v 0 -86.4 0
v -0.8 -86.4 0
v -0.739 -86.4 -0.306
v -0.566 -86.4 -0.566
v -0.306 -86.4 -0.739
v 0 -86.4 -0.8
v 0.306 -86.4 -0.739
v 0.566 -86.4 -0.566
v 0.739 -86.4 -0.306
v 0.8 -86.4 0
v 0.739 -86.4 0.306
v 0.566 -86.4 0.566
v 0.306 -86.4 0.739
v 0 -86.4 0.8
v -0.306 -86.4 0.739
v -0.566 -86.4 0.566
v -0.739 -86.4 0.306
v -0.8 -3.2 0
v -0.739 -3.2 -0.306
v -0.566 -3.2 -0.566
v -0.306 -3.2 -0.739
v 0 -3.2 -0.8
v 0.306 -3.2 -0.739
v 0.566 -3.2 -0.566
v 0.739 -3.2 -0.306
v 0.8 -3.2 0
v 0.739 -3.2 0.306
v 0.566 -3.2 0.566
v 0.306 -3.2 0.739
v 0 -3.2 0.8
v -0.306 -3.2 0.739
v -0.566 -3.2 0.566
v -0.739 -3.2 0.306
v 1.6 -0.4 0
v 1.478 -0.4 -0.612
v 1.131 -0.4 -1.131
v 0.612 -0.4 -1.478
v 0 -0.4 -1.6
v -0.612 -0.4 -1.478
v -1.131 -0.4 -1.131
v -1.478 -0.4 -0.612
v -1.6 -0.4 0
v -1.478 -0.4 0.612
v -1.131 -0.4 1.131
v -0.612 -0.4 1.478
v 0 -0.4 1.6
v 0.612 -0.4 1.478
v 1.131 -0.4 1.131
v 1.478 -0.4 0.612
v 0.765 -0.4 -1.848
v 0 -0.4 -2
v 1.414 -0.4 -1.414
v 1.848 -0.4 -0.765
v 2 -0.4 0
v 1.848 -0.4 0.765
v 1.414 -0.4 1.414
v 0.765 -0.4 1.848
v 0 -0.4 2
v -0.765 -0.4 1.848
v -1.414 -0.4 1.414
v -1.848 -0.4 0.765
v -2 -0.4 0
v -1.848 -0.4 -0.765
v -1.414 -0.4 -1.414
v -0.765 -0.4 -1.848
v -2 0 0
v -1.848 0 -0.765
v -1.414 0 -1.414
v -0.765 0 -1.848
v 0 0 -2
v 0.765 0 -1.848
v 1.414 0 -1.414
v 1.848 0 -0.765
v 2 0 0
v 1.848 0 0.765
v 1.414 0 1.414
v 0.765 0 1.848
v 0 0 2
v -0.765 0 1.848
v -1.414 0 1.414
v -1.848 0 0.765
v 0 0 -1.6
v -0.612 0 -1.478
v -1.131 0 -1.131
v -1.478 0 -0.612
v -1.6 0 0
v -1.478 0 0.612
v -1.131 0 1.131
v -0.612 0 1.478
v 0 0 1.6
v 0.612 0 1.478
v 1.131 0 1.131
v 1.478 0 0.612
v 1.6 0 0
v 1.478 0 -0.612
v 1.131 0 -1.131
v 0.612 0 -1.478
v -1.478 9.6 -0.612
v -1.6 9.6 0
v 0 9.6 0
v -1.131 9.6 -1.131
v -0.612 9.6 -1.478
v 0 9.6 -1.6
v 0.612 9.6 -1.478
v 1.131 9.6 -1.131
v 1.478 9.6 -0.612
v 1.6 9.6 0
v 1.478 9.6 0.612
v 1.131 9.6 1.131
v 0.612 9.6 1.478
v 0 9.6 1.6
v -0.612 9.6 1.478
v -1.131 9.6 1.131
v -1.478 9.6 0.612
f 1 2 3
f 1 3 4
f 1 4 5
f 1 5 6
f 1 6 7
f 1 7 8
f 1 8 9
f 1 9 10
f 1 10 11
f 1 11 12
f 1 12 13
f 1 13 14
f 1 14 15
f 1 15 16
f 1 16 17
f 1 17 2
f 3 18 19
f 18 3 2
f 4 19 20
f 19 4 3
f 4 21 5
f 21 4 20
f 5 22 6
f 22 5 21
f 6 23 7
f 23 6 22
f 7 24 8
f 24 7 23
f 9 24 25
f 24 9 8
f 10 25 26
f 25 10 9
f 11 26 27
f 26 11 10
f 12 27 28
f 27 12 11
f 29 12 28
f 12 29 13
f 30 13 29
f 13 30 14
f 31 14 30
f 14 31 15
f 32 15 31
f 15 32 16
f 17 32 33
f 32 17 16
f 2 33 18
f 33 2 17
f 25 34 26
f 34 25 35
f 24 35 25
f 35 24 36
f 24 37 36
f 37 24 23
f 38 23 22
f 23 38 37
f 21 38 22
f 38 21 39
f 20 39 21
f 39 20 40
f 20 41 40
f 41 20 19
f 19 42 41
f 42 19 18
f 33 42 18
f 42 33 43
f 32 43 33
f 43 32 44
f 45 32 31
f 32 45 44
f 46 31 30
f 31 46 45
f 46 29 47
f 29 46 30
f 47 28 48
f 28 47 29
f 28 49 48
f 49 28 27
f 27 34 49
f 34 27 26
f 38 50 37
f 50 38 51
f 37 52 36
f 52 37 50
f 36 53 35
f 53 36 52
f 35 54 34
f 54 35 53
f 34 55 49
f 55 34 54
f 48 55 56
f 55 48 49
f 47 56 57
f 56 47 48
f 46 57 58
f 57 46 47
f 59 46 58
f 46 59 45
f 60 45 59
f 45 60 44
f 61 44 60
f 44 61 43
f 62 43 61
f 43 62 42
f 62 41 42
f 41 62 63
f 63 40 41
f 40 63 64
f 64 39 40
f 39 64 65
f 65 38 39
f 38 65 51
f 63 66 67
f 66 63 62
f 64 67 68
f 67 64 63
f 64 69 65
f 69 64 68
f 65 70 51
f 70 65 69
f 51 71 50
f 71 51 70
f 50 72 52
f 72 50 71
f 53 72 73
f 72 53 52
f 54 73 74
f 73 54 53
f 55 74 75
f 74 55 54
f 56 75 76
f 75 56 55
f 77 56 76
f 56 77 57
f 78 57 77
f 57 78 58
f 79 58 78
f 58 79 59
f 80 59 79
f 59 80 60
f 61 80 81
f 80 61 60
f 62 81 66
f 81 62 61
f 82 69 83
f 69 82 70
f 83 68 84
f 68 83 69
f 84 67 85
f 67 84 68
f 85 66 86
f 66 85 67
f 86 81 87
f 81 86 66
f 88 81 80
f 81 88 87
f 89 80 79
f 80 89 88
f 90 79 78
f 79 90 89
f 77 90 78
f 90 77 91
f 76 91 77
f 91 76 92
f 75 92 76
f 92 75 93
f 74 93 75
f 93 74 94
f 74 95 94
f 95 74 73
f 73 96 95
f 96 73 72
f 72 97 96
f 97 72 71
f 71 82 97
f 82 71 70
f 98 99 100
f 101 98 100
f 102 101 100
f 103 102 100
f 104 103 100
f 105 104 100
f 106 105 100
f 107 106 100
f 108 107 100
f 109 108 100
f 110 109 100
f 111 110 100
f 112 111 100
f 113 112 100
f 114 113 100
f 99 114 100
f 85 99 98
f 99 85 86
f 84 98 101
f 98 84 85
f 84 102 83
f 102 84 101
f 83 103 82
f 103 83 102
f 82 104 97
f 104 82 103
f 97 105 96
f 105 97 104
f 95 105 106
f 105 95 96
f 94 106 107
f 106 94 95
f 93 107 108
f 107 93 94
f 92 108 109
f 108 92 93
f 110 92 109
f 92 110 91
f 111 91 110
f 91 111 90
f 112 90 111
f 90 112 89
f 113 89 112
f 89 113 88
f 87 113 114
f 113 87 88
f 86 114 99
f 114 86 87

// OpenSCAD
// file: ../p/stud3.scad
use <../lib.scad>
use <4-4cyli.scad>
use <4-4disc.scad>
use <4-4edge.scad>
$fa=1; $fs=0.2;
function ldraw_lib__stud3(realsolid=false) = realsolid ? 
    [openscad(translate([0,0,-eps()], o=cylinder(4+eps(), r=4)),2)] : [
// 0 Stud Tube Solid
// 0 Name: stud3.dat
// 0 Author: James Jessiman
// 0 !LDRAW_ORG Primitive UPDATE 2012-01
// 0 !LICENSE Licensed under CC BY 2.0 and CC BY 4.0 : see CAreadme.txt
// 
// 0 BFC CERTIFY CCW
  [0,"BFC","CERTIFY"],
  [0,"BFC","CCW"],
// 
// 0 !HISTORY 2002-04-04 [sbliss] Modified for BFC compliance
// 0 !HISTORY 2002-04-25 [PTadmin] Official Update 2002-02
// 0 !HISTORY 2007-06-24 [PTadmin] Header formatted for Contributor Agreement
// 0 !HISTORY 2008-07-01 [PTadmin] Official Update 2008-01
// 0 !HISTORY 2012-02-16 [Philo] Changed to CCW
// 0 !HISTORY 2012-03-30 [PTadmin] Official Update 2012-01
// 
// 
// 1 16 0 -4 0 4 0 0 0 1 0 0 0 4 4-4edge.dat
  [1,16,0,-4,0,4,0,0,0,1,0,0,0,4, ldraw_lib__4_4edge(realsolid)],
// 1 16 0 0 0 4 0 0 0 1 0 0 0 4 4-4edge.dat
  [1,16,0,0,0,4,0,0,0,1,0,0,0,4, ldraw_lib__4_4edge(realsolid)],
// 1 16 0 -4 0 4 0 0 0 1 0 0 0 4 4-4disc.dat
  [1,16,0,-4,0,4,0,0,0,1,0,0,0,4, ldraw_lib__4_4disc(realsolid)],
// 1 16 0 -4 0 4 0 0 0 4 0 0 0 4 4-4cyli.dat
  [1,16,0,-4,0,4,0,0,0,4,0,0,0,4, ldraw_lib__4_4cyli(realsolid)],
];
module ldraw_lib__stud3(step=0, col=false, unit=2/5, alt=false, line=0.2, solid=!$preview)
    makepoly(ldraw_lib__stud3(solid), step=step, col=col, unit=unit, alt=alt, line=line, solid=solid);
ldraw_lib__stud3(line=0.2);
// file: ../p/stud.scad
use <../lib.scad>
use <4-4cyli.scad>
use <4-4disc.scad>
use <4-4edge.scad>
$fa=1; $fs=0.2;
function ldraw_lib__stud(realsolid=false) = realsolid ? 
    [openscad(translate([0,0,-eps()], o=cylinder(4+eps(), r=6)),2)] : [
// 0 Stud
// 0 Name: stud.dat
// 0 Author: James Jessiman
// 0 !LDRAW_ORG Primitive UPDATE 2012-01
// 0 !LICENSE Licensed under CC BY 2.0 and CC BY 4.0 : see CAreadme.txt
// 
// 0 BFC CERTIFY CCW
  [0,"BFC","CERTIFY"],
  [0,"BFC","CCW"],
// 
// 0 !HISTORY 2002-04-04 [sbliss] Modified for BFC compliance
// 0 !HISTORY 2002-04-25 [PTadmin] Official Update 2002-02
// 0 !HISTORY 2007-06-24 [PTadmin] Header formatted for Contributor Agreement
// 0 !HISTORY 2008-07-01 [PTadmin] Official Update 2008-01
// 0 !HISTORY 2012-02-16 [Philo] Changed to CCW
// 0 !HISTORY 2012-03-30 [PTadmin] Official Update 2012-01
// 
// 
// 1 16 0 0 0 6 0 0 0 1 0 0 0 6 4-4edge.dat
  [1,16,0,0,0,6,0,0,0,1,0,0,0,6, ldraw_lib__4_4edge(realsolid)],
// 1 16 0 -4 0 6 0 0 0 1 0 0 0 6 4-4edge.dat
  [1,16,0,-4,0,6,0,0,0,1,0,0,0,6, ldraw_lib__4_4edge(realsolid)],
// 1 16 0 0 0 6 0 0 0 -4 0 0 0 6 4-4cyli.dat
  [1,16,0,0,0,6,0,0,0,-4,0,0,0,6, ldraw_lib__4_4cyli(realsolid)],
// 1 16 0 -4 0 6 0 0 0 1 0 0 0 6 4-4disc.dat
  [1,16,0,-4,0,6,0,0,0,1,0,0,0,6, ldraw_lib__4_4disc(realsolid)],
];
module ldraw_lib__stud(step=0, col=false, unit=2/5, alt=false, line=0.2, solid=!$preview)
    makepoly(ldraw_lib__stud(solid), step=step, col=col, unit=unit, alt=alt, line=line, solid=solid);
ldraw_lib__stud(line=0.2);
// file: ../p/box5.scad
use <../lib.scad>
$fa=1; $fs=0.2;
function ldraw_lib__box5(realsolid=false) = [
// 0 Box with 5 Faces and All Edges
// 0 Name: box5.dat
// 0 Author: James Jessiman
// 0 !LDRAW_ORG Primitive UPDATE 2012-01
// 0 !LICENSE Licensed under CC BY 2.0 and CC BY 4.0 : see CAreadme.txt
// 
// 0 BFC CERTIFY CCW
  [0,"BFC","CERTIFY"],
  [0,"BFC","CCW"],
// 
// 0 !HISTORY 2002-04-03 [sbliss] Modified for BFC compliance
// 0 !HISTORY 2002-04-25 [PTadmin] Official Update 2002-02
// 0 !HISTORY 2007-06-24 [PTadmin] Header formatted for Contributor Agreement
// 0 !HISTORY 2008-07-01 [PTadmin] Official Update 2008-01
// 0 !HISTORY 2012-02-16 [Philo] Changed to CCW
// 0 !HISTORY 2012-03-30 [PTadmin] Official Update 2012-01
// 
// 
// 2 24 1 1 1 -1 1 1
  [2,24,1,1,1,-1,1,1],
// 2 24 -1 1 1 -1 1 -1
  [2,24,-1,1,1,-1,1,-1],
// 2 24 -1 1 -1 1 1 -1
  [2,24,-1,1,-1,1,1,-1],
// 2 24 1 1 -1 1 1 1
  [2,24,1,1,-1,1,1,1],
// 2 24 1 0 1 -1 0 1
  [2,24,1,0,1,-1,0,1],
// 2 24 -1 0 1 -1 0 -1
  [2,24,-1,0,1,-1,0,-1],
// 2 24 -1 0 -1 1 0 -1
  [2,24,-1,0,-1,1,0,-1],
// 2 24 1 0 -1 1 0 1
  [2,24,1,0,-1,1,0,1],
// 2 24 1 0 1 1 1 1
  [2,24,1,0,1,1,1,1],
// 2 24 -1 0 1 -1 1 1
  [2,24,-1,0,1,-1,1,1],
// 2 24 1 0 -1 1 1 -1
  [2,24,1,0,-1,1,1,-1],
// 2 24 -1 0 -1 -1 1 -1
  [2,24,-1,0,-1,-1,1,-1],
// 4 16 -1 1 1 1 1 1 1 1 -1 -1 1 -1
  [4,16,-1,1,1,1,1,1,1,1,-1,-1,1,-1],
// 4 16 -1 1 1 -1 0 1 1 0 1 1 1 1
  [4,16,-1,1,1,-1,0,1,1,0,1,1,1,1],
// 4 16 -1 1 -1 -1 0 -1 -1 0 1 -1 1 1
  [4,16,-1,1,-1,-1,0,-1,-1,0,1,-1,1,1],
// 4 16 1 1 -1 1 0 -1 -1 0 -1 -1 1 -1
  [4,16,1,1,-1,1,0,-1,-1,0,-1,-1,1,-1],
// 4 16 1 1 1 1 0 1 1 0 -1 1 1 -1
  [4,16,1,1,1,1,0,1,1,0,-1,1,1,-1],
];
module ldraw_lib__box5(step=0, col=false, unit=2/5, alt=false, line=0.2, solid=!$preview)
    makepoly(ldraw_lib__box5(solid), step=step, col=col, unit=unit, alt=alt, line=line, solid=solid);
ldraw_lib__box5(line=0.2);
// file: ../p/box4t.scad
use <../lib.scad>
$fa=1; $fs=0.2;
function ldraw_lib__box4t(realsolid=false) = [
// 0 Box with 4 Adjacent Faces and All Edges
// 0 Name: box4t.dat
// 0 Author: Tore Eriksson [Tore_Eriksson]
// 0 !LDRAW_ORG Primitive UPDATE 2003-02
// 0 !LICENSE Licensed under CC BY 2.0 and CC BY 4.0 : see CAreadme.txt
// 
// 0 BFC CERTIFY CCW
  [0,"BFC","CERTIFY"],
  [0,"BFC","CCW"],
// 
// 0 !HISTORY 1997-09-29 [PTadmin] Official Update 1997-15
// 0 !HISTORY 2002-08-31 [izanette] Modified with WINDZ for BFC compliance
// 0 !HISTORY 2003-08-01 [PTadmin] Official Update 2003-02
// 0 !HISTORY 2007-06-24 [PTadmin] Header formatted for Contributor Agreement
// 0 !HISTORY 2008-07-01 [PTadmin] Official Update 2008-01
// 
// 
// 2 24 1 1 1 -1 1 1
  [2,24,1,1,1,-1,1,1],
// 2 24 -1 1 1 -1 1 -1
  [2,24,-1,1,1,-1,1,-1],
// 2 24 -1 1 -1 1 1 -1
  [2,24,-1,1,-1,1,1,-1],
// 2 24 1 1 -1 1 1 1
  [2,24,1,1,-1,1,1,1],
// 2 24 1 0 1 -1 0 1
  [2,24,1,0,1,-1,0,1],
// 2 24 -1 0 1 -1 0 -1
  [2,24,-1,0,1,-1,0,-1],
// 2 24 -1 0 -1 1 0 -1
  [2,24,-1,0,-1,1,0,-1],
// 2 24 1 0 -1 1 0 1
  [2,24,1,0,-1,1,0,1],
// 2 24 1 0 1 1 1 1
  [2,24,1,0,1,1,1,1],
// 2 24 -1 0 1 -1 1 1
  [2,24,-1,0,1,-1,1,1],
// 2 24 1 0 -1 1 1 -1
  [2,24,1,0,-1,1,1,-1],
// 2 24 -1 0 -1 -1 1 -1
  [2,24,-1,0,-1,-1,1,-1],
// 4 16 1 1 1 1 1 -1 -1 1 -1 -1 1 1
  [4,16,1,1,1,1,1,-1,-1,1,-1,-1,1,1],
// 4 16 1 1 1 -1 1 1 -1 0 1 1 0 1
  [4,16,1,1,1,-1,1,1,-1,0,1,1,0,1],
// 4 16 -1 1 1 -1 1 -1 -1 0 -1 -1 0 1
  [4,16,-1,1,1,-1,1,-1,-1,0,-1,-1,0,1],
// 0 4 16 -1 1 -1 -1 0 -1 1 0 -1 1 1 -1
// 4 16 1 1 -1 1 1 1 1 0 1 1 0 -1
  [4,16,1,1,-1,1,1,1,1,0,1,1,0,-1],
// 0
];
module ldraw_lib__box4t(step=0, col=false, unit=2/5, alt=false, line=0.2, solid=!$preview)
    makepoly(ldraw_lib__box4t(solid), step=step, col=col, unit=unit, alt=alt, line=line, solid=solid);
ldraw_lib__box4t(line=0.2);
// file: s/3004s01.scad
use <../../lib.scad>
use <../../p/box4t.scad>
use <../../p/box5.scad>
use <../../p/stud.scad>
use <../../p/stud3.scad>
$fa=1; $fs=0.2;
function ldraw_lib__s__3004s01(realsolid=false) = [
// 0 ~Brick  1 x  2 without Front Face
// 0 Name: s\3004s01.dat
// 0 Author: James Jessiman
// 0 !LDRAW_ORG Subpart UPDATE 2003-03
// 0 !LICENSE Licensed under CC BY 2.0 and CC BY 4.0 : see CAreadme.txt
// 
// 0 BFC CERTIFY CCW
  [0,"BFC","CERTIFY"],
  [0,"BFC","CCW"],
// 
// 0 !HISTORY 2003-09-07 [jriley] Subfiling, BFC
// 0 !HISTORY 2003-12-19 [PTadmin] Official Update 2003-03
// 0 !HISTORY 2007-08-29 [PTadmin] Header formatted for Contributor Agreement
// 0 !HISTORY 2008-07-01 [PTadmin] Official Update 2008-01
// 
// 
// 1 16 0 4 0 1 0 0 0 -5 0 0 0 1 stud3.dat
  [1,16,0,4,0,1,0,0,0,-5,0,0,0,1, ldraw_lib__stud3(realsolid)],
// 0 BFC INVERTNEXT
  [0,"BFC","INVERTNEXT"],
// 1 16 0 24 0 16 0 0 0 -20 0 0 0 6 box5.dat
  [1,16,0,24,0,16,0,0,0,-20,0,0,0,6, ldraw_lib__box5(realsolid)],
// 4 16 20 24 10 16 24 6 -16 24 6 -20 24 10
  [4,16,20,24,10,16,24,6,-16,24,6,-20,24,10],
// 4 16 -20 24 10 -16 24 6 -16 24 -6 -20 24 -10
  [4,16,-20,24,10,-16,24,6,-16,24,-6,-20,24,-10],
// 4 16 -20 24 -10 -16 24 -6 16 24 -6 20 24 -10
  [4,16,-20,24,-10,-16,24,-6,16,24,-6,20,24,-10],
// 4 16 20 24 -10 16 24 -6 16 24 6 20 24 10
  [4,16,20,24,-10,16,24,-6,16,24,6,20,24,10],
// 1 16 0 24 0 20 0 0 0 -24 0 0 0 10 box4t.dat
  [1,16,0,24,0,20,0,0,0,-24,0,0,0,10, ldraw_lib__box4t(realsolid)],
// 1 16 10 0 0 1 0 0 0 1 0 0 0 1 stud.dat
  [1,16,10,0,0,1,0,0,0,1,0,0,0,1, ldraw_lib__stud(realsolid)],
// 1 16 -10 0 0 1 0 0 0 1 0 0 0 1 stud.dat
  [1,16,-10,0,0,1,0,0,0,1,0,0,0,1, ldraw_lib__stud(realsolid)],
// 0
];
module ldraw_lib__s__3004s01(step=0, col=false, unit=2/5, alt=false, line=0.2, solid=!$preview)
    makepoly(ldraw_lib__s__3004s01(solid), step=step, col=col, unit=unit, alt=alt, line=line, solid=solid);
ldraw_lib__s__3004s01(line=0.2);
// file: ../p/4-4disc.scad
use <../lib.scad>
$fa=1; $fs=0.2;
function ldraw_lib__4_4disc(realsolid=false) = [
// 0 Disc 1.0
// 0 Name: 4-4disc.dat
// 0 Author: James Jessiman
// 0 !LDRAW_ORG Primitive UPDATE 2002-02
// 0 !LICENSE Licensed under CC BY 2.0 and CC BY 4.0 : see CAreadme.txt
// 
// 0 BFC CERTIFY CCW
  [0,"BFC","CERTIFY"],
  [0,"BFC","CCW"],
// 
// 0 !HISTORY 1998-12-15 [PTadmin] Official Update 1998-10
// 0 !HISTORY 2002-03-23 [sbliss] Added BFC statement
// 0 !HISTORY 2002-04-25 [PTadmin] Official Update 2002-02
// 0 !HISTORY 2007-06-24 [PTadmin] Header formatted for Contributor Agreement
// 0 !HISTORY 2008-07-01 [PTadmin] Official Update 2008-01
// 
// 
// 3 16 0 0 0 1 0 0 0.9239 0 0.3827
  [3,16,0,0,0,1,0,0,0.9239,0,0.3827],
// 3 16 0 0 0 0.9239 0 0.3827 0.7071 0 0.7071
  [3,16,0,0,0,0.9239,0,0.3827,0.7071,0,0.7071],
// 3 16 0 0 0 0.7071 0 0.7071 0.3827 0 0.9239
  [3,16,0,0,0,0.7071,0,0.7071,0.3827,0,0.9239],
// 3 16 0 0 0 0.3827 0 0.9239 0 0 1
  [3,16,0,0,0,0.3827,0,0.9239,0,0,1],
// 3 16 0 0 0 0 0 1 -0.3827 0 0.9239
  [3,16,0,0,0,0,0,1,-0.3827,0,0.9239],
// 3 16 0 0 0 -0.3827 0 0.9239 -0.7071 0 0.7071
  [3,16,0,0,0,-0.3827,0,0.9239,-0.7071,0,0.7071],
// 3 16 0 0 0 -0.7071 0 0.7071 -0.9239 0 0.3827
  [3,16,0,0,0,-0.7071,0,0.7071,-0.9239,0,0.3827],
// 3 16 0 0 0 -0.9239 0 0.3827 -1 0 -0
  [3,16,0,0,0,-0.9239,0,0.3827,-1,0,-0],
// 3 16 0 0 0 -1 0 -0 -0.9239 0 -0.3827
  [3,16,0,0,0,-1,0,-0,-0.9239,0,-0.3827],
// 3 16 0 0 0 -0.9239 0 -0.3827 -0.7071 0 -0.7071
  [3,16,0,0,0,-0.9239,0,-0.3827,-0.7071,0,-0.7071],
// 3 16 0 0 0 -0.7071 0 -0.7071 -0.3827 0 -0.9239
  [3,16,0,0,0,-0.7071,0,-0.7071,-0.3827,0,-0.9239],
// 3 16 0 0 0 -0.3827 0 -0.9239 0 0 -1
  [3,16,0,0,0,-0.3827,0,-0.9239,0,0,-1],
// 3 16 0 0 0 0 0 -1 0.3827 0 -0.9239
  [3,16,0,0,0,0,0,-1,0.3827,0,-0.9239],
// 3 16 0 0 0 0.3827 0 -0.9239 0.7071 0 -0.7071
  [3,16,0,0,0,0.3827,0,-0.9239,0.7071,0,-0.7071],
// 3 16 0 0 0 0.7071 0 -0.7071 0.9239 0 -0.3827
  [3,16,0,0,0,0.7071,0,-0.7071,0.9239,0,-0.3827],
// 3 16 0 0 0 0.9239 0 -0.3827 1 0 0
  [3,16,0,0,0,0.9239,0,-0.3827,1,0,0],
// 0
];
module ldraw_lib__4_4disc(step=0, col=false, unit=2/5, alt=false, line=0.2, solid=!$preview)
    makepoly(ldraw_lib__4_4disc(solid), step=step, col=col, unit=unit, alt=alt, line=line, solid=solid);
ldraw_lib__4_4disc(line=0.2);
// file: ../p/4-4cyli.scad
use <../lib.scad>
$fa=1; $fs=0.2;
function ldraw_lib__4_4cyli(realsolid=false) = [
// 0 Cylinder 1.0
// 0 Name: 4-4cyli.dat
// 0 Author: James Jessiman
// 0 !LDRAW_ORG Primitive UPDATE 2005-01
// 0 !LICENSE Licensed under CC BY 2.0 and CC BY 4.0 : see CAreadme.txt
// 
// 0 BFC CERTIFY CCW
  [0,"BFC","CERTIFY"],
  [0,"BFC","CCW"],
// 
// 0 !HISTORY 1998-12-15 [PTadmin] Official Update 1998-10
// 0 !HISTORY 2002-03-23 [sbliss] Added BFC statement; merged headers from files in distributions LDraw 0.27 and Complete.
// 0 !HISTORY 2002-04-25 [PTadmin] Official Update 2002-02
// 0 !HISTORY 2004-12-14 [guyvivan] BFC CCW
// 0 !HISTORY 2005-12-28 [PTadmin] Official Update 2005-01
// 0 !HISTORY 2007-06-24 [PTadmin] Header formatted for Contributor Agreement
// 0 !HISTORY 2008-07-01 [PTadmin] Official Update 2008-01
// 
// 
// 4 16 1 1 0 0.9239 1 0.3827 0.9239 0 0.3827 1 0 0
  [4,16,1,1,0,0.9239,1,0.3827,0.9239,0,0.3827,1,0,0],
// 5 24 1 0 0 1 1 0 0.9239 0 0.3827 0.9239 0 -0.3827
  [5,24,1,0,0,1,1,0,0.9239,0,0.3827,0.9239,0,-0.3827],
// 4 16 0.9239 1 0.3827 0.7071 1 0.7071 0.7071 0 0.7071 0.9239 0 0.3827
  [4,16,0.9239,1,0.3827,0.7071,1,0.7071,0.7071,0,0.7071,0.9239,0,0.3827],
// 5 24 0.9239 0 0.3827 0.9239 1 0.3827 0.7071 0 0.7071 1 0 0
  [5,24,0.9239,0,0.3827,0.9239,1,0.3827,0.7071,0,0.7071,1,0,0],
// 4 16 0.7071 1 0.7071 0.3827 1 0.9239 0.3827 0 0.9239 0.7071 0 0.7071
  [4,16,0.7071,1,0.7071,0.3827,1,0.9239,0.3827,0,0.9239,0.7071,0,0.7071],
// 5 24 0.7071 0 0.7071 0.7071 1 0.7071 0.3827 0 0.9239 0.9239 0 0.3827
  [5,24,0.7071,0,0.7071,0.7071,1,0.7071,0.3827,0,0.9239,0.9239,0,0.3827],
// 4 16 0.3827 1 0.9239 0 1 1 0 0 1 0.3827 0 0.9239
  [4,16,0.3827,1,0.9239,0,1,1,0,0,1,0.3827,0,0.9239],
// 5 24 0.3827 0 0.9239 0.3827 1 0.9239 0 0 1 0.7071 0 0.7071
  [5,24,0.3827,0,0.9239,0.3827,1,0.9239,0,0,1,0.7071,0,0.7071],
// 4 16 0 1 1 -0.3827 1 0.9239 -0.3827 0 0.9239 0 0 1
  [4,16,0,1,1,-0.3827,1,0.9239,-0.3827,0,0.9239,0,0,1],
// 5 24 0 0 1 0 1 1 -0.3827 0 0.9239 0.3827 0 0.9239
  [5,24,0,0,1,0,1,1,-0.3827,0,0.9239,0.3827,0,0.9239],
// 4 16 -0.3827 1 0.9239 -0.7071 1 0.7071 -0.7071 0 0.7071 -0.3827 0 0.9239
  [4,16,-0.3827,1,0.9239,-0.7071,1,0.7071,-0.7071,0,0.7071,-0.3827,0,0.9239],
// 5 24 -0.3827 0 0.9239 -0.3827 1 0.9239 -0.7071 0 0.7071 0 0 1
  [5,24,-0.3827,0,0.9239,-0.3827,1,0.9239,-0.7071,0,0.7071,0,0,1],
// 4 16 -0.7071 1 0.7071 -0.9239 1 0.3827 -0.9239 0 0.3827 -0.7071 0 0.7071
  [4,16,-0.7071,1,0.7071,-0.9239,1,0.3827,-0.9239,0,0.3827,-0.7071,0,0.7071],
// 5 24 -0.7071 0 0.7071 -0.7071 1 0.7071 -0.9239 0 0.3827 -0.3827 0 0.9239
  [5,24,-0.7071,0,0.7071,-0.7071,1,0.7071,-0.9239,0,0.3827,-0.3827,0,0.9239],
// 4 16 -0.9239 1 0.3827 -1 1 0 -1 0 0 -0.9239 0 0.3827
  [4,16,-0.9239,1,0.3827,-1,1,0,-1,0,0,-0.9239,0,0.3827],
// 5 24 -0.9239 0 0.3827 -0.9239 1 0.3827 -1 0 0 -0.7071 0 0.7071
  [5,24,-0.9239,0,0.3827,-0.9239,1,0.3827,-1,0,0,-0.7071,0,0.7071],
// 4 16 -1 1 0 -0.9239 1 -0.3827 -0.9239 0 -0.3827 -1 0 0
  [4,16,-1,1,0,-0.9239,1,-0.3827,-0.9239,0,-0.3827,-1,0,0],
// 5 24 -1 0 0 -1 1 0 -0.9239 0 -0.3827 -0.9239 0 0.3827
  [5,24,-1,0,0,-1,1,0,-0.9239,0,-0.3827,-0.9239,0,0.3827],
// 4 16 -0.9239 1 -0.3827 -0.7071 1 -0.7071 -0.7071 0 -0.7071 -0.9239 0 -0.3827
  [4,16,-0.9239,1,-0.3827,-0.7071,1,-0.7071,-0.7071,0,-0.7071,-0.9239,0,-0.3827],
// 5 24 -0.9239 0 -0.3827 -0.9239 1 -0.3827 -0.7071 0 -0.7071 -1 0 0
  [5,24,-0.9239,0,-0.3827,-0.9239,1,-0.3827,-0.7071,0,-0.7071,-1,0,0],
// 4 16 -0.7071 1 -0.7071 -0.3827 1 -0.9239 -0.3827 0 -0.9239 -0.7071 0 -0.7071
  [4,16,-0.7071,1,-0.7071,-0.3827,1,-0.9239,-0.3827,0,-0.9239,-0.7071,0,-0.7071],
// 5 24 -0.7071 0 -0.7071 -0.7071 1 -0.7071 -0.3827 0 -0.9239 -0.9239 0 -0.3827
  [5,24,-0.7071,0,-0.7071,-0.7071,1,-0.7071,-0.3827,0,-0.9239,-0.9239,0,-0.3827],
// 4 16 -0.3827 1 -0.9239 0 1 -1 0 0 -1 -0.3827 0 -0.9239
  [4,16,-0.3827,1,-0.9239,0,1,-1,0,0,-1,-0.3827,0,-0.9239],
// 5 24 -0.3827 0 -0.9239 -0.3827 1 -0.9239 0 0 -1 -0.7071 0 -0.7071
  [5,24,-0.3827,0,-0.9239,-0.3827,1,-0.9239,0,0,-1,-0.7071,0,-0.7071],
// 4 16 0 1 -1 0.3827 1 -0.9239 0.3827 0 -0.9239 0 0 -1
  [4,16,0,1,-1,0.3827,1,-0.9239,0.3827,0,-0.9239,0,0,-1],
// 5 24 0 0 -1 0 1 -1 0.3827 0 -0.9239 -0.3827 0 -0.9239
  [5,24,0,0,-1,0,1,-1,0.3827,0,-0.9239,-0.3827,0,-0.9239],
// 4 16 0.3827 1 -0.9239 0.7071 1 -0.7071 0.7071 0 -0.7071 0.3827 0 -0.9239
  [4,16,0.3827,1,-0.9239,0.7071,1,-0.7071,0.7071,0,-0.7071,0.3827,0,-0.9239],
// 5 24 0.3827 0 -0.9239 0.3827 1 -0.9239 0.7071 0 -0.7071 0 0 -1
  [5,24,0.3827,0,-0.9239,0.3827,1,-0.9239,0.7071,0,-0.7071,0,0,-1],
// 4 16 0.7071 1 -0.7071 0.9239 1 -0.3827 0.9239 0 -0.3827 0.7071 0 -0.7071
  [4,16,0.7071,1,-0.7071,0.9239,1,-0.3827,0.9239,0,-0.3827,0.7071,0,-0.7071],
// 5 24 0.7071 0 -0.7071 0.7071 1 -0.7071 0.9239 0 -0.3827 0.3827 0 -0.9239
  [5,24,0.7071,0,-0.7071,0.7071,1,-0.7071,0.9239,0,-0.3827,0.3827,0,-0.9239],
// 4 16 0.9239 1 -0.3827 1 1 0 1 0 0 0.9239 0 -0.3827
  [4,16,0.9239,1,-0.3827,1,1,0,1,0,0,0.9239,0,-0.3827],
// 5 24 0.9239 0 -0.3827 0.9239 1 -0.3827 1 0 0 0.7071 0 -0.7071
  [5,24,0.9239,0,-0.3827,0.9239,1,-0.3827,1,0,0,0.7071,0,-0.7071],
// 0
];
module ldraw_lib__4_4cyli(step=0, col=false, unit=2/5, alt=false, line=0.2, solid=!$preview)
    makepoly(ldraw_lib__4_4cyli(solid), step=step, col=col, unit=unit, alt=alt, line=line, solid=solid);
ldraw_lib__4_4cyli(line=0.2);
// file: 3004.scad
use <../lib.scad>
use <s/3004s01.scad>
$fa=1; $fs=0.2;
function ldraw_lib__3004(realsolid=false) = [
// 0 Brick  1 x  2
// 0 Name: 3004.dat
// 0 Author: James Jessiman
// 0 !LDRAW_ORG Part UPDATE 2022-05
// 0 !LICENSE Licensed under CC BY 2.0 and CC BY 4.0 : see CAreadme.txt
// 
// 0 BFC CERTIFY CCW
  [0,"BFC","CERTIFY"],
  [0,"BFC","CCW"],
// 
// 0 !HISTORY 2001-10-26 [PTadmin] Official Update 2001-01
// 0 !HISTORY 2002-05-07 {unknown} BFC Certification
// 0 !HISTORY 2002-06-11 [PTadmin] Official Update 2002-03
// 0 !HISTORY 2007-05-07 [PTadmin] Header formatted for Contributor Agreement
// 0 !HISTORY 2008-07-01 [PTadmin] Official Update 2008-01
// 0 !HISTORY 2022-08-04 [MagFors] Using subfile
// 0 !HISTORY 2022-09-15 [PTadmin] Official Update 2022-05
// 
// 
// 1 16 0 0 0 1 0 0 0 1 0 0 0 1 s\3004s01.dat
  [1,16,0,0,0,1,0,0,0,1,0,0,0,1, ldraw_lib__s__3004s01(realsolid)],
// 4 16 -20 24 -10 20 24 -10 20 0 -10 -20 0 -10
  [4,16,-20,24,-10,20,24,-10,20,0,-10,-20,0,-10],
];
module ldraw_lib__3004(step=0, col=false, unit=2/5, alt=false, line=0.2, solid=!$preview)
    makepoly(ldraw_lib__3004(solid), step=step, col=col, unit=unit, alt=alt, line=line, solid=solid);
ldraw_lib__3004(line=0.2);
// file: ../p/4-4ring4.scad
use <../lib.scad>
$fa=1; $fs=0.2;
function ldraw_lib__4_4ring4(realsolid=false) = [
// 0 Ring  4 x 1.0
// 0 Name: 4-4ring4.dat
// 0 Author: James Jessiman
// 0 !LDRAW_ORG Primitive UPDATE 2009-01
// 0 !LICENSE Licensed under CC BY 2.0 and CC BY 4.0 : see CAreadme.txt
// 
// 0 BFC CERTIFY CCW
  [0,"BFC","CERTIFY"],
  [0,"BFC","CCW"],
// 
// 0 !HISTORY 1998-12-15 [PTadmin] Official Update 1998-10
// 0 !HISTORY 2002-04-08 [BrickCaster] Modified for BFC compliance
// 0 !HISTORY 2002-04-25 [PTadmin] Official Update 2002-02
// 0 !HISTORY 2007-06-24 [PTadmin] Header formatted for Contributor Agreement
// 0 !HISTORY 2008-07-01 [PTadmin] Official Update 2008-01
// 0 !HISTORY 2008-08-26 [cwdee] Switch polygon winding and rename
// 0 !HISTORY 2009-05-02 [PTadmin] Official Update 2009-01
// 
// 
// 4 16 -1.9135 0 4.6195 -1.5308 0 3.6956 0 0 4 0 0 5
  [4,16,-1.9135,0,4.6195,-1.5308,0,3.6956,0,0,4,0,0,5],
// 4 16 -3.5355 0 3.5355 -2.8284 0 2.8284 -1.5308 0 3.6956 -1.9135 0 4.6195
  [4,16,-3.5355,0,3.5355,-2.8284,0,2.8284,-1.5308,0,3.6956,-1.9135,0,4.6195],
// 4 16 -4.6195 0 1.9135 -3.6956 0 1.5308 -2.8284 0 2.8284 -3.5355 0 3.5355
  [4,16,-4.6195,0,1.9135,-3.6956,0,1.5308,-2.8284,0,2.8284,-3.5355,0,3.5355],
// 4 16 -5 0 0 -4 0 0 -3.6956 0 1.5308 -4.6195 0 1.9135
  [4,16,-5,0,0,-4,0,0,-3.6956,0,1.5308,-4.6195,0,1.9135],
// 4 16 -4.6195 0 -1.9135 -3.6956 0 -1.5308 -4 0 0 -5 0 0
  [4,16,-4.6195,0,-1.9135,-3.6956,0,-1.5308,-4,0,0,-5,0,0],
// 4 16 -3.5355 0 -3.5355 -2.8284 0 -2.8284 -3.6956 0 -1.5308 -4.6195 0 -1.9135
  [4,16,-3.5355,0,-3.5355,-2.8284,0,-2.8284,-3.6956,0,-1.5308,-4.6195,0,-1.9135],
// 4 16 -1.9135 0 -4.6195 -1.5308 0 -3.6956 -2.8284 0 -2.8284 -3.5355 0 -3.5355
  [4,16,-1.9135,0,-4.6195,-1.5308,0,-3.6956,-2.8284,0,-2.8284,-3.5355,0,-3.5355],
// 4 16 0 0 -5 0 0 -4 -1.5308 0 -3.6956 -1.9135 0 -4.6195
  [4,16,0,0,-5,0,0,-4,-1.5308,0,-3.6956,-1.9135,0,-4.6195],
// 4 16 1.9135 0 -4.6195 1.5308 0 -3.6956 0 0 -4 0 0 -5
  [4,16,1.9135,0,-4.6195,1.5308,0,-3.6956,0,0,-4,0,0,-5],
// 4 16 3.5355 0 -3.5355 2.8284 0 -2.8284 1.5308 0 -3.6956 1.9135 0 -4.6195
  [4,16,3.5355,0,-3.5355,2.8284,0,-2.8284,1.5308,0,-3.6956,1.9135,0,-4.6195],
// 4 16 4.6195 0 -1.9135 3.6956 0 -1.5308 2.8284 0 -2.8284 3.5355 0 -3.5355
  [4,16,4.6195,0,-1.9135,3.6956,0,-1.5308,2.8284,0,-2.8284,3.5355,0,-3.5355],
// 4 16 5 0 0 4 0 0 3.6956 0 -1.5308 4.6195 0 -1.9135
  [4,16,5,0,0,4,0,0,3.6956,0,-1.5308,4.6195,0,-1.9135],
// 4 16 4.6195 0 1.9135 3.6956 0 1.5308 4 0 0 5 0 0
  [4,16,4.6195,0,1.9135,3.6956,0,1.5308,4,0,0,5,0,0],
// 4 16 3.5355 0 3.5355 2.8284 0 2.8284 3.6956 0 1.5308 4.6195 0 1.9135
  [4,16,3.5355,0,3.5355,2.8284,0,2.8284,3.6956,0,1.5308,4.6195,0,1.9135],
// 4 16 1.9135 0 4.6195 1.5308 0 3.6956 2.8284 0 2.8284 3.5355 0 3.5355
  [4,16,1.9135,0,4.6195,1.5308,0,3.6956,2.8284,0,2.8284,3.5355,0,3.5355],
// 4 16 0 0 5 0 0 4 1.5308 0 3.6956 1.9135 0 4.6195
  [4,16,0,0,5,0,0,4,1.5308,0,3.6956,1.9135,0,4.6195],
// 0
];
module ldraw_lib__4_4ring4(step=0, col=false, unit=2/5, alt=false, line=0.2, solid=!$preview)
    makepoly(ldraw_lib__4_4ring4(solid), step=step, col=col, unit=unit, alt=alt, line=line, solid=solid);
ldraw_lib__4_4ring4(line=0.2);
// file: ../p/4-4edge.scad
use <../lib.scad>
$fa=1; $fs=0.2;
function ldraw_lib__4_4edge(realsolid=false) = [
// 0 Circle 1.0
// 0 Name: 4-4edge.dat
// 0 Author: James Jessiman
// 0 !LDRAW_ORG Primitive UPDATE 2017-01
// 0 !LICENSE Licensed under CC BY 2.0 and CC BY 4.0 : see CAreadme.txt
// 
// 0 BFC CERTIFY CCW
  [0,"BFC","CERTIFY"],
  [0,"BFC","CCW"],
// 
// 0 !HISTORY 1998-12-15 [PTadmin] Official Update 1998-10
// 0 !HISTORY 2005-12-28 [PTadmin] Official Update 2005-01
// 0 !HISTORY 2007-06-24 [PTadmin] Header formatted for Contributor Agreement
// 0 !HISTORY 2008-07-01 [PTadmin] Official Update 2008-01
// 0 !HISTORY 2017-01-15 [Steffen] BFCed
// 0 !HISTORY 2017-12-30 [PTadmin] Official Update 2017-01
// 
// 
// 2 24 1 0 0 0.9239 0 0.3827
  [2,24,1,0,0,0.9239,0,0.3827],
// 2 24 0.9239 0 0.3827 0.7071 0 0.7071
  [2,24,0.9239,0,0.3827,0.7071,0,0.7071],
// 2 24 0.7071 0 0.7071 0.3827 0 0.9239
  [2,24,0.7071,0,0.7071,0.3827,0,0.9239],
// 2 24 0.3827 0 0.9239 0 0 1
  [2,24,0.3827,0,0.9239,0,0,1],
// 2 24 0 0 1 -0.3827 0 0.9239
  [2,24,0,0,1,-0.3827,0,0.9239],
// 2 24 -0.3827 0 0.9239 -0.7071 0 0.7071
  [2,24,-0.3827,0,0.9239,-0.7071,0,0.7071],
// 2 24 -0.7071 0 0.7071 -0.9239 0 0.3827
  [2,24,-0.7071,0,0.7071,-0.9239,0,0.3827],
// 2 24 -0.9239 0 0.3827 -1 0 -0
  [2,24,-0.9239,0,0.3827,-1,0,-0],
// 2 24 -1 0 -0 -0.9239 0 -0.3827
  [2,24,-1,0,-0,-0.9239,0,-0.3827],
// 2 24 -0.9239 0 -0.3827 -0.7071 0 -0.7071
  [2,24,-0.9239,0,-0.3827,-0.7071,0,-0.7071],
// 2 24 -0.7071 0 -0.7071 -0.3827 0 -0.9239
  [2,24,-0.7071,0,-0.7071,-0.3827,0,-0.9239],
// 2 24 -0.3827 0 -0.9239 0 0 -1
  [2,24,-0.3827,0,-0.9239,0,0,-1],
// 2 24 0 0 -1 0.3827 0 -0.9239
  [2,24,0,0,-1,0.3827,0,-0.9239],
// 2 24 0.3827 0 -0.9239 0.7071 0 -0.7071
  [2,24,0.3827,0,-0.9239,0.7071,0,-0.7071],
// 2 24 0.7071 0 -0.7071 0.9239 0 -0.3827
  [2,24,0.7071,0,-0.7071,0.9239,0,-0.3827],
// 2 24 0.9239 0 -0.3827 1 0 0
  [2,24,0.9239,0,-0.3827,1,0,0],
];
module ldraw_lib__4_4edge(step=0, col=false, unit=2/5, alt=false, line=0.2, solid=!$preview)
    makepoly(ldraw_lib__4_4edge(solid), step=step, col=col, unit=unit, alt=alt, line=line, solid=solid);
ldraw_lib__4_4edge(line=0.2);
// file: ../p/4-4cylo.scad
use <../lib.scad>
use <4-4cyli.scad>
use <4-4edge.scad>
$fa=1; $fs=0.2;
function ldraw_lib__4_4cylo(realsolid=false) = [
// 0 Cylinder Open 1.0
// 0 Name: 4-4cylo.dat
// 0 Author: Mark Kennedy [mkennedy]
// 0 !LDRAW_ORG Primitive UPDATE 2010-01
// 0 !LICENSE Licensed under CC BY 2.0 and CC BY 4.0 : see CAreadme.txt
// 
// 0 BFC CERTIFY CCW
  [0,"BFC","CERTIFY"],
  [0,"BFC","CCW"],
// 
// 0 !HISTORY 2010-04-05 [PTadmin] Official Update 2010-01
// 
// 
// 1 16 0 0 0 1 0 0 0 1 0 0 0 1 4-4edge.dat
  [1,16,0,0,0,1,0,0,0,1,0,0,0,1, ldraw_lib__4_4edge(realsolid)],
// 1 16 0 1 0 1 0 0 0 1 0 0 0 1 4-4edge.dat
  [1,16,0,1,0,1,0,0,0,1,0,0,0,1, ldraw_lib__4_4edge(realsolid)],
// 1 16 0 0 0 1 0 0 0 1 0 0 0 1 4-4cyli.dat
  [1,16,0,0,0,1,0,0,0,1,0,0,0,1, ldraw_lib__4_4cyli(realsolid)],
// 0
];
module ldraw_lib__4_4cylo(step=0, col=false, unit=2/5, alt=false, line=0.2, solid=!$preview)
    makepoly(ldraw_lib__4_4cylo(solid), step=step, col=col, unit=unit, alt=alt, line=line, solid=solid);
ldraw_lib__4_4cylo(line=0.2);
// file: ../p/4-4cylc.scad
use <../lib.scad>
use <4-4cyli.scad>
use <4-4disc.scad>
use <4-4edge.scad>
$fa=1; $fs=0.2;
function ldraw_lib__4_4cylc(realsolid=false) = [
// 0 Cylinder Closed 1.0
// 0 Name: 4-4cylc.dat
// 0 Author: Alex Taylor [anathema]
// 0 !LDRAW_ORG Primitive UPDATE 2009-02
// 0 !LICENSE Licensed under CC BY 2.0 and CC BY 4.0 : see CAreadme.txt
// 
// 0 BFC CERTIFY CCW
  [0,"BFC","CERTIFY"],
  [0,"BFC","CCW"],
// 
// 0 !HISTORY 2008-12-29 [cwdee] Removed one disc
// 0 !HISTORY 2009-09-03 [PTadmin] Official Update 2009-02
// 
// 
// 1 16 0 0 0 1 0 0 0 1 0 0 0 1 4-4edge.dat
  [1,16,0,0,0,1,0,0,0,1,0,0,0,1, ldraw_lib__4_4edge(realsolid)],
// 1 16 0 1 0 1 0 0 0 1 0 0 0 1 4-4edge.dat
  [1,16,0,1,0,1,0,0,0,1,0,0,0,1, ldraw_lib__4_4edge(realsolid)],
// 1 16 0 0 0 1 0 0 0 1 0 0 0 1 4-4disc.dat
  [1,16,0,0,0,1,0,0,0,1,0,0,0,1, ldraw_lib__4_4disc(realsolid)],
// 1 16 0 0 0 1 0 0 0 1 0 0 0 1 4-4cyli.dat
  [1,16,0,0,0,1,0,0,0,1,0,0,0,1, ldraw_lib__4_4cyli(realsolid)],
// 0
];
module ldraw_lib__4_4cylc(step=0, col=false, unit=2/5, alt=false, line=0.2, solid=!$preview)
    makepoly(ldraw_lib__4_4cylc(solid), step=step, col=col, unit=unit, alt=alt, line=line, solid=solid);
ldraw_lib__4_4cylc(line=0.2);
// file: ../p/4-4con1.scad
use <../lib.scad>
$fa=1; $fs=0.2;
function ldraw_lib__4_4con1(realsolid=false) = [
// 0 Cone  1 x 1.0
// 0 Name: 4-4con1.dat
// 0 Author: Steve Bliss [sbliss]
// 0 !LDRAW_ORG Primitive UPDATE 2012-01
// 0 !LICENSE Licensed under CC BY 2.0 and CC BY 4.0 : see CAreadme.txt
// 
// 0 BFC CERTIFY CCW
  [0,"BFC","CERTIFY"],
  [0,"BFC","CCW"],
// 
// 0 !HISTORY 1999-08-19 [sbliss] Renamed 4-4con12.dat to 4-4con1.dat, Moved all conditional lines before quads
// 0 !HISTORY 2000-05-07 [PTadmin] Official Update 2000-01
// 0 !HISTORY 2002-12-11 [cwdee] Standardised title and made BFC compliant
// 0 !HISTORY 2003-08-01 [PTadmin] Official Update 2003-02
// 0 !HISTORY 2007-06-24 [PTadmin] Header formatted for Contributor Agreement
// 0 !HISTORY 2008-07-01 [PTadmin] Official Update 2008-01
// 0 !HISTORY 2012-02-16 [Philo] Changed to CCW, reordered
// 0 !HISTORY 2012-03-30 [PTadmin] Official Update 2012-01
// 
// 
// 5 24 1 1 0 2 0 0 0.9239 1 -0.3827 0.9239 1 0.3827
  [5,24,1,1,0,2,0,0,0.9239,1,-0.3827,0.9239,1,0.3827],
// 5 24 0.9239 1 0.3827 1.8478 0 0.7654 1 1 0 0.7071 1 0.7071
  [5,24,0.9239,1,0.3827,1.8478,0,0.7654,1,1,0,0.7071,1,0.7071],
// 5 24 0.7071 1 0.7071 1.4142 0 1.4142 0.9239 1 0.3827 0.3827 1 0.9239
  [5,24,0.7071,1,0.7071,1.4142,0,1.4142,0.9239,1,0.3827,0.3827,1,0.9239],
// 5 24 0.3827 1 0.9239 0.7654 0 1.8478 0.7071 1 0.7071 0 1 1
  [5,24,0.3827,1,0.9239,0.7654,0,1.8478,0.7071,1,0.7071,0,1,1],
// 5 24 0 1 1 0 0 2 0.3827 1 0.9239 -0.3827 1 0.9239
  [5,24,0,1,1,0,0,2,0.3827,1,0.9239,-0.3827,1,0.9239],
// 5 24 -0.3827 1 0.9239 -0.7654 0 1.8478 0 1 1 -0.7071 1 0.7071
  [5,24,-0.3827,1,0.9239,-0.7654,0,1.8478,0,1,1,-0.7071,1,0.7071],
// 5 24 -0.7071 1 0.7071 -1.4142 0 1.4142 -0.3827 1 0.9239 -0.9239 1 0.3827
  [5,24,-0.7071,1,0.7071,-1.4142,0,1.4142,-0.3827,1,0.9239,-0.9239,1,0.3827],
// 5 24 -0.9239 1 0.3827 -1.8478 0 0.7654 -0.7071 1 0.7071 -1 1 0
  [5,24,-0.9239,1,0.3827,-1.8478,0,0.7654,-0.7071,1,0.7071,-1,1,0],
// 5 24 -1 1 0 -2 0 0 -0.9239 1 0.3827 -0.9239 1 -0.3827
  [5,24,-1,1,0,-2,0,0,-0.9239,1,0.3827,-0.9239,1,-0.3827],
// 5 24 -0.9239 1 -0.3827 -1.8478 0 -0.7654 -1 1 0 -0.7071 1 -0.7071
  [5,24,-0.9239,1,-0.3827,-1.8478,0,-0.7654,-1,1,0,-0.7071,1,-0.7071],
// 5 24 -0.7071 1 -0.7071 -1.4142 0 -1.4142 -0.9239 1 -0.3827 -0.3827 1 -0.9239
  [5,24,-0.7071,1,-0.7071,-1.4142,0,-1.4142,-0.9239,1,-0.3827,-0.3827,1,-0.9239],
// 5 24 -0.3827 1 -0.9239 -0.7654 0 -1.8478 -0.7071 1 -0.7071 0 1 -1
  [5,24,-0.3827,1,-0.9239,-0.7654,0,-1.8478,-0.7071,1,-0.7071,0,1,-1],
// 5 24 0 1 -1 0 0 -2 -0.3827 1 -0.9239 0.3827 1 -0.9239
  [5,24,0,1,-1,0,0,-2,-0.3827,1,-0.9239,0.3827,1,-0.9239],
// 5 24 0.3827 1 -0.9239 0.7654 0 -1.8478 0 1 -1 0.7071 1 -0.7071
  [5,24,0.3827,1,-0.9239,0.7654,0,-1.8478,0,1,-1,0.7071,1,-0.7071],
// 5 24 0.7071 1 -0.7071 1.4142 0 -1.4142 0.3827 1 -0.9239 0.9239 1 -0.3827
  [5,24,0.7071,1,-0.7071,1.4142,0,-1.4142,0.3827,1,-0.9239,0.9239,1,-0.3827],
// 5 24 0.9239 1 -0.3827 1.8478 0 -0.7654 0.7071 1 -0.7071 1 1 0
  [5,24,0.9239,1,-0.3827,1.8478,0,-0.7654,0.7071,1,-0.7071,1,1,0],
// 
// 4 16 2 0 0 1 1 0 0.9239 1 0.3827 1.8478 0 0.7654
  [4,16,2,0,0,1,1,0,0.9239,1,0.3827,1.8478,0,0.7654],
// 4 16 1.8478 0 0.7654 0.9239 1 0.3827 0.7071 1 0.7071 1.4142 0 1.4142
  [4,16,1.8478,0,0.7654,0.9239,1,0.3827,0.7071,1,0.7071,1.4142,0,1.4142],
// 4 16 1.4142 0 1.4142 0.7071 1 0.7071 0.3827 1 0.9239 0.7654 0 1.8478
  [4,16,1.4142,0,1.4142,0.7071,1,0.7071,0.3827,1,0.9239,0.7654,0,1.8478],
// 4 16 0.7654 0 1.8478 0.3827 1 0.9239 0 1 1 0 0 2
  [4,16,0.7654,0,1.8478,0.3827,1,0.9239,0,1,1,0,0,2],
// 4 16 0 0 2 0 1 1 -0.3827 1 0.9239 -0.7654 0 1.8478
  [4,16,0,0,2,0,1,1,-0.3827,1,0.9239,-0.7654,0,1.8478],
// 4 16 -0.7654 0 1.8478 -0.3827 1 0.9239 -0.7071 1 0.7071 -1.4142 0 1.4142
  [4,16,-0.7654,0,1.8478,-0.3827,1,0.9239,-0.7071,1,0.7071,-1.4142,0,1.4142],
// 4 16 -1.4142 0 1.4142 -0.7071 1 0.7071 -0.9239 1 0.3827 -1.8478 0 0.7654
  [4,16,-1.4142,0,1.4142,-0.7071,1,0.7071,-0.9239,1,0.3827,-1.8478,0,0.7654],
// 4 16 -1.8478 0 0.7654 -0.9239 1 0.3827 -1 1 0 -2 0 0
  [4,16,-1.8478,0,0.7654,-0.9239,1,0.3827,-1,1,0,-2,0,0],
// 4 16 -2 0 0 -1 1 0 -0.9239 1 -0.3827 -1.8478 0 -0.7654
  [4,16,-2,0,0,-1,1,0,-0.9239,1,-0.3827,-1.8478,0,-0.7654],
// 4 16 -1.8478 0 -0.7654 -0.9239 1 -0.3827 -0.7071 1 -0.7071 -1.4142 0 -1.4142
  [4,16,-1.8478,0,-0.7654,-0.9239,1,-0.3827,-0.7071,1,-0.7071,-1.4142,0,-1.4142],
// 4 16 -1.4142 0 -1.4142 -0.7071 1 -0.7071 -0.3827 1 -0.9239 -0.7654 0 -1.8478
  [4,16,-1.4142,0,-1.4142,-0.7071,1,-0.7071,-0.3827,1,-0.9239,-0.7654,0,-1.8478],
// 4 16 -0.7654 0 -1.8478 -0.3827 1 -0.9239 0 1 -1 0 0 -2
  [4,16,-0.7654,0,-1.8478,-0.3827,1,-0.9239,0,1,-1,0,0,-2],
// 4 16 0 0 -2 0 1 -1 0.3827 1 -0.9239 0.7654 0 -1.8478
  [4,16,0,0,-2,0,1,-1,0.3827,1,-0.9239,0.7654,0,-1.8478],
// 4 16 0.7654 0 -1.8478 0.3827 1 -0.9239 0.7071 1 -0.7071 1.4142 0 -1.4142
  [4,16,0.7654,0,-1.8478,0.3827,1,-0.9239,0.7071,1,-0.7071,1.4142,0,-1.4142],
// 4 16 1.4142 0 -1.4142 0.7071 1 -0.7071 0.9239 1 -0.3827 1.8478 0 -0.7654
  [4,16,1.4142,0,-1.4142,0.7071,1,-0.7071,0.9239,1,-0.3827,1.8478,0,-0.7654],
// 4 16 1.8478 0 -0.7654 0.9239 1 -0.3827 1 1 0 2 0 0
  [4,16,1.8478,0,-0.7654,0.9239,1,-0.3827,1,1,0,2,0,0],
];
module ldraw_lib__4_4con1(step=0, col=false, unit=2/5, alt=false, line=0.2, solid=!$preview)
    makepoly(ldraw_lib__4_4con1(solid), step=step, col=col, unit=unit, alt=alt, line=line, solid=solid);
ldraw_lib__4_4con1(line=0.2);
// main file
use <../lib.scad>
use <../p/4-4con1.scad>
use <../p/4-4cylc.scad>
use <../p/4-4cylo.scad>
use <../p/4-4edge.scad>
use <../p/4-4ring4.scad>
$fa=1; $fs=0.2;
function ldraw_lib__6640a(realsolid=false) = [
// 0 Electric Technic Fiber Optics Cable  12L
// 0 Name: 6640a.dat
// 0 Author: Magnus Forsberg [MagFors]
// 0 !LDRAW_ORG Part UPDATE 2022-06
// 0 !LICENSE Licensed under CC BY 2.0 and CC BY 4.0 : see CAreadme.txt
// 
// 0 BFC CERTIFY CCW
  [0,"BFC","CERTIFY"],
  [0,"BFC","CCW"],
// 
// 0 !HISTORY 2022-12-20 [PTadmin] Official Update 2022-06
// 
// 
// 1 16 0 0 -216 -2 0 0 0 0 2 0 208 0 4-4cylc.dat
  [1,16,0,0,-216,-2,0,0,0,0,2,0,208,0, ldraw_lib__4_4cylc(realsolid)],
// 1 16 0 0 -1 -4 0 0 0 0 4 0 1 0 4-4edge.dat
  [1,16,0,0,-1,-4,0,0,0,0,4,0,1,0, ldraw_lib__4_4edge(realsolid)],
// 1 16 0 0 -1 2 0 0 0 0 2 0 -7 0 4-4con1.dat
  [1,16,0,0,-1,2,0,0,0,0,2,0,-7,0, ldraw_lib__4_4con1(realsolid)],
// 1 16 0 0 -1 -1 0 0 0 0 1 0 1 0 4-4ring4.dat
  [1,16,0,0,-1,-1,0,0,0,0,1,0,1,0, ldraw_lib__4_4ring4(realsolid)],
// 1 16 0 0 -1 -5 0 0 0 0 5 0 1 0 4-4cylo.dat
  [1,16,0,0,-1,-5,0,0,0,0,5,0,1,0, ldraw_lib__4_4cylo(realsolid)],
// 1 16 0 0 0 1 0 0 0 0 1 0 -1 0 4-4ring4.dat
  [1,16,0,0,0,1,0,0,0,0,1,0,-1,0, ldraw_lib__4_4ring4(realsolid)],
// 1 16 0 0 24 -4 0 0 0 0 4 0 -24 0 4-4cylc.dat
  [1,16,0,0,24,-4,0,0,0,0,4,0,-24,0, ldraw_lib__4_4cylc(realsolid)],
];
module ldraw_lib__6640a(step=0, col=false, unit=2/5, alt=false, line=0.2, solid=!$preview)
    makepoly(ldraw_lib__6640a(solid), step=step, col=col, unit=unit, alt=alt, line=line, solid=solid);
ldraw_lib__6640a(line=0.2);
